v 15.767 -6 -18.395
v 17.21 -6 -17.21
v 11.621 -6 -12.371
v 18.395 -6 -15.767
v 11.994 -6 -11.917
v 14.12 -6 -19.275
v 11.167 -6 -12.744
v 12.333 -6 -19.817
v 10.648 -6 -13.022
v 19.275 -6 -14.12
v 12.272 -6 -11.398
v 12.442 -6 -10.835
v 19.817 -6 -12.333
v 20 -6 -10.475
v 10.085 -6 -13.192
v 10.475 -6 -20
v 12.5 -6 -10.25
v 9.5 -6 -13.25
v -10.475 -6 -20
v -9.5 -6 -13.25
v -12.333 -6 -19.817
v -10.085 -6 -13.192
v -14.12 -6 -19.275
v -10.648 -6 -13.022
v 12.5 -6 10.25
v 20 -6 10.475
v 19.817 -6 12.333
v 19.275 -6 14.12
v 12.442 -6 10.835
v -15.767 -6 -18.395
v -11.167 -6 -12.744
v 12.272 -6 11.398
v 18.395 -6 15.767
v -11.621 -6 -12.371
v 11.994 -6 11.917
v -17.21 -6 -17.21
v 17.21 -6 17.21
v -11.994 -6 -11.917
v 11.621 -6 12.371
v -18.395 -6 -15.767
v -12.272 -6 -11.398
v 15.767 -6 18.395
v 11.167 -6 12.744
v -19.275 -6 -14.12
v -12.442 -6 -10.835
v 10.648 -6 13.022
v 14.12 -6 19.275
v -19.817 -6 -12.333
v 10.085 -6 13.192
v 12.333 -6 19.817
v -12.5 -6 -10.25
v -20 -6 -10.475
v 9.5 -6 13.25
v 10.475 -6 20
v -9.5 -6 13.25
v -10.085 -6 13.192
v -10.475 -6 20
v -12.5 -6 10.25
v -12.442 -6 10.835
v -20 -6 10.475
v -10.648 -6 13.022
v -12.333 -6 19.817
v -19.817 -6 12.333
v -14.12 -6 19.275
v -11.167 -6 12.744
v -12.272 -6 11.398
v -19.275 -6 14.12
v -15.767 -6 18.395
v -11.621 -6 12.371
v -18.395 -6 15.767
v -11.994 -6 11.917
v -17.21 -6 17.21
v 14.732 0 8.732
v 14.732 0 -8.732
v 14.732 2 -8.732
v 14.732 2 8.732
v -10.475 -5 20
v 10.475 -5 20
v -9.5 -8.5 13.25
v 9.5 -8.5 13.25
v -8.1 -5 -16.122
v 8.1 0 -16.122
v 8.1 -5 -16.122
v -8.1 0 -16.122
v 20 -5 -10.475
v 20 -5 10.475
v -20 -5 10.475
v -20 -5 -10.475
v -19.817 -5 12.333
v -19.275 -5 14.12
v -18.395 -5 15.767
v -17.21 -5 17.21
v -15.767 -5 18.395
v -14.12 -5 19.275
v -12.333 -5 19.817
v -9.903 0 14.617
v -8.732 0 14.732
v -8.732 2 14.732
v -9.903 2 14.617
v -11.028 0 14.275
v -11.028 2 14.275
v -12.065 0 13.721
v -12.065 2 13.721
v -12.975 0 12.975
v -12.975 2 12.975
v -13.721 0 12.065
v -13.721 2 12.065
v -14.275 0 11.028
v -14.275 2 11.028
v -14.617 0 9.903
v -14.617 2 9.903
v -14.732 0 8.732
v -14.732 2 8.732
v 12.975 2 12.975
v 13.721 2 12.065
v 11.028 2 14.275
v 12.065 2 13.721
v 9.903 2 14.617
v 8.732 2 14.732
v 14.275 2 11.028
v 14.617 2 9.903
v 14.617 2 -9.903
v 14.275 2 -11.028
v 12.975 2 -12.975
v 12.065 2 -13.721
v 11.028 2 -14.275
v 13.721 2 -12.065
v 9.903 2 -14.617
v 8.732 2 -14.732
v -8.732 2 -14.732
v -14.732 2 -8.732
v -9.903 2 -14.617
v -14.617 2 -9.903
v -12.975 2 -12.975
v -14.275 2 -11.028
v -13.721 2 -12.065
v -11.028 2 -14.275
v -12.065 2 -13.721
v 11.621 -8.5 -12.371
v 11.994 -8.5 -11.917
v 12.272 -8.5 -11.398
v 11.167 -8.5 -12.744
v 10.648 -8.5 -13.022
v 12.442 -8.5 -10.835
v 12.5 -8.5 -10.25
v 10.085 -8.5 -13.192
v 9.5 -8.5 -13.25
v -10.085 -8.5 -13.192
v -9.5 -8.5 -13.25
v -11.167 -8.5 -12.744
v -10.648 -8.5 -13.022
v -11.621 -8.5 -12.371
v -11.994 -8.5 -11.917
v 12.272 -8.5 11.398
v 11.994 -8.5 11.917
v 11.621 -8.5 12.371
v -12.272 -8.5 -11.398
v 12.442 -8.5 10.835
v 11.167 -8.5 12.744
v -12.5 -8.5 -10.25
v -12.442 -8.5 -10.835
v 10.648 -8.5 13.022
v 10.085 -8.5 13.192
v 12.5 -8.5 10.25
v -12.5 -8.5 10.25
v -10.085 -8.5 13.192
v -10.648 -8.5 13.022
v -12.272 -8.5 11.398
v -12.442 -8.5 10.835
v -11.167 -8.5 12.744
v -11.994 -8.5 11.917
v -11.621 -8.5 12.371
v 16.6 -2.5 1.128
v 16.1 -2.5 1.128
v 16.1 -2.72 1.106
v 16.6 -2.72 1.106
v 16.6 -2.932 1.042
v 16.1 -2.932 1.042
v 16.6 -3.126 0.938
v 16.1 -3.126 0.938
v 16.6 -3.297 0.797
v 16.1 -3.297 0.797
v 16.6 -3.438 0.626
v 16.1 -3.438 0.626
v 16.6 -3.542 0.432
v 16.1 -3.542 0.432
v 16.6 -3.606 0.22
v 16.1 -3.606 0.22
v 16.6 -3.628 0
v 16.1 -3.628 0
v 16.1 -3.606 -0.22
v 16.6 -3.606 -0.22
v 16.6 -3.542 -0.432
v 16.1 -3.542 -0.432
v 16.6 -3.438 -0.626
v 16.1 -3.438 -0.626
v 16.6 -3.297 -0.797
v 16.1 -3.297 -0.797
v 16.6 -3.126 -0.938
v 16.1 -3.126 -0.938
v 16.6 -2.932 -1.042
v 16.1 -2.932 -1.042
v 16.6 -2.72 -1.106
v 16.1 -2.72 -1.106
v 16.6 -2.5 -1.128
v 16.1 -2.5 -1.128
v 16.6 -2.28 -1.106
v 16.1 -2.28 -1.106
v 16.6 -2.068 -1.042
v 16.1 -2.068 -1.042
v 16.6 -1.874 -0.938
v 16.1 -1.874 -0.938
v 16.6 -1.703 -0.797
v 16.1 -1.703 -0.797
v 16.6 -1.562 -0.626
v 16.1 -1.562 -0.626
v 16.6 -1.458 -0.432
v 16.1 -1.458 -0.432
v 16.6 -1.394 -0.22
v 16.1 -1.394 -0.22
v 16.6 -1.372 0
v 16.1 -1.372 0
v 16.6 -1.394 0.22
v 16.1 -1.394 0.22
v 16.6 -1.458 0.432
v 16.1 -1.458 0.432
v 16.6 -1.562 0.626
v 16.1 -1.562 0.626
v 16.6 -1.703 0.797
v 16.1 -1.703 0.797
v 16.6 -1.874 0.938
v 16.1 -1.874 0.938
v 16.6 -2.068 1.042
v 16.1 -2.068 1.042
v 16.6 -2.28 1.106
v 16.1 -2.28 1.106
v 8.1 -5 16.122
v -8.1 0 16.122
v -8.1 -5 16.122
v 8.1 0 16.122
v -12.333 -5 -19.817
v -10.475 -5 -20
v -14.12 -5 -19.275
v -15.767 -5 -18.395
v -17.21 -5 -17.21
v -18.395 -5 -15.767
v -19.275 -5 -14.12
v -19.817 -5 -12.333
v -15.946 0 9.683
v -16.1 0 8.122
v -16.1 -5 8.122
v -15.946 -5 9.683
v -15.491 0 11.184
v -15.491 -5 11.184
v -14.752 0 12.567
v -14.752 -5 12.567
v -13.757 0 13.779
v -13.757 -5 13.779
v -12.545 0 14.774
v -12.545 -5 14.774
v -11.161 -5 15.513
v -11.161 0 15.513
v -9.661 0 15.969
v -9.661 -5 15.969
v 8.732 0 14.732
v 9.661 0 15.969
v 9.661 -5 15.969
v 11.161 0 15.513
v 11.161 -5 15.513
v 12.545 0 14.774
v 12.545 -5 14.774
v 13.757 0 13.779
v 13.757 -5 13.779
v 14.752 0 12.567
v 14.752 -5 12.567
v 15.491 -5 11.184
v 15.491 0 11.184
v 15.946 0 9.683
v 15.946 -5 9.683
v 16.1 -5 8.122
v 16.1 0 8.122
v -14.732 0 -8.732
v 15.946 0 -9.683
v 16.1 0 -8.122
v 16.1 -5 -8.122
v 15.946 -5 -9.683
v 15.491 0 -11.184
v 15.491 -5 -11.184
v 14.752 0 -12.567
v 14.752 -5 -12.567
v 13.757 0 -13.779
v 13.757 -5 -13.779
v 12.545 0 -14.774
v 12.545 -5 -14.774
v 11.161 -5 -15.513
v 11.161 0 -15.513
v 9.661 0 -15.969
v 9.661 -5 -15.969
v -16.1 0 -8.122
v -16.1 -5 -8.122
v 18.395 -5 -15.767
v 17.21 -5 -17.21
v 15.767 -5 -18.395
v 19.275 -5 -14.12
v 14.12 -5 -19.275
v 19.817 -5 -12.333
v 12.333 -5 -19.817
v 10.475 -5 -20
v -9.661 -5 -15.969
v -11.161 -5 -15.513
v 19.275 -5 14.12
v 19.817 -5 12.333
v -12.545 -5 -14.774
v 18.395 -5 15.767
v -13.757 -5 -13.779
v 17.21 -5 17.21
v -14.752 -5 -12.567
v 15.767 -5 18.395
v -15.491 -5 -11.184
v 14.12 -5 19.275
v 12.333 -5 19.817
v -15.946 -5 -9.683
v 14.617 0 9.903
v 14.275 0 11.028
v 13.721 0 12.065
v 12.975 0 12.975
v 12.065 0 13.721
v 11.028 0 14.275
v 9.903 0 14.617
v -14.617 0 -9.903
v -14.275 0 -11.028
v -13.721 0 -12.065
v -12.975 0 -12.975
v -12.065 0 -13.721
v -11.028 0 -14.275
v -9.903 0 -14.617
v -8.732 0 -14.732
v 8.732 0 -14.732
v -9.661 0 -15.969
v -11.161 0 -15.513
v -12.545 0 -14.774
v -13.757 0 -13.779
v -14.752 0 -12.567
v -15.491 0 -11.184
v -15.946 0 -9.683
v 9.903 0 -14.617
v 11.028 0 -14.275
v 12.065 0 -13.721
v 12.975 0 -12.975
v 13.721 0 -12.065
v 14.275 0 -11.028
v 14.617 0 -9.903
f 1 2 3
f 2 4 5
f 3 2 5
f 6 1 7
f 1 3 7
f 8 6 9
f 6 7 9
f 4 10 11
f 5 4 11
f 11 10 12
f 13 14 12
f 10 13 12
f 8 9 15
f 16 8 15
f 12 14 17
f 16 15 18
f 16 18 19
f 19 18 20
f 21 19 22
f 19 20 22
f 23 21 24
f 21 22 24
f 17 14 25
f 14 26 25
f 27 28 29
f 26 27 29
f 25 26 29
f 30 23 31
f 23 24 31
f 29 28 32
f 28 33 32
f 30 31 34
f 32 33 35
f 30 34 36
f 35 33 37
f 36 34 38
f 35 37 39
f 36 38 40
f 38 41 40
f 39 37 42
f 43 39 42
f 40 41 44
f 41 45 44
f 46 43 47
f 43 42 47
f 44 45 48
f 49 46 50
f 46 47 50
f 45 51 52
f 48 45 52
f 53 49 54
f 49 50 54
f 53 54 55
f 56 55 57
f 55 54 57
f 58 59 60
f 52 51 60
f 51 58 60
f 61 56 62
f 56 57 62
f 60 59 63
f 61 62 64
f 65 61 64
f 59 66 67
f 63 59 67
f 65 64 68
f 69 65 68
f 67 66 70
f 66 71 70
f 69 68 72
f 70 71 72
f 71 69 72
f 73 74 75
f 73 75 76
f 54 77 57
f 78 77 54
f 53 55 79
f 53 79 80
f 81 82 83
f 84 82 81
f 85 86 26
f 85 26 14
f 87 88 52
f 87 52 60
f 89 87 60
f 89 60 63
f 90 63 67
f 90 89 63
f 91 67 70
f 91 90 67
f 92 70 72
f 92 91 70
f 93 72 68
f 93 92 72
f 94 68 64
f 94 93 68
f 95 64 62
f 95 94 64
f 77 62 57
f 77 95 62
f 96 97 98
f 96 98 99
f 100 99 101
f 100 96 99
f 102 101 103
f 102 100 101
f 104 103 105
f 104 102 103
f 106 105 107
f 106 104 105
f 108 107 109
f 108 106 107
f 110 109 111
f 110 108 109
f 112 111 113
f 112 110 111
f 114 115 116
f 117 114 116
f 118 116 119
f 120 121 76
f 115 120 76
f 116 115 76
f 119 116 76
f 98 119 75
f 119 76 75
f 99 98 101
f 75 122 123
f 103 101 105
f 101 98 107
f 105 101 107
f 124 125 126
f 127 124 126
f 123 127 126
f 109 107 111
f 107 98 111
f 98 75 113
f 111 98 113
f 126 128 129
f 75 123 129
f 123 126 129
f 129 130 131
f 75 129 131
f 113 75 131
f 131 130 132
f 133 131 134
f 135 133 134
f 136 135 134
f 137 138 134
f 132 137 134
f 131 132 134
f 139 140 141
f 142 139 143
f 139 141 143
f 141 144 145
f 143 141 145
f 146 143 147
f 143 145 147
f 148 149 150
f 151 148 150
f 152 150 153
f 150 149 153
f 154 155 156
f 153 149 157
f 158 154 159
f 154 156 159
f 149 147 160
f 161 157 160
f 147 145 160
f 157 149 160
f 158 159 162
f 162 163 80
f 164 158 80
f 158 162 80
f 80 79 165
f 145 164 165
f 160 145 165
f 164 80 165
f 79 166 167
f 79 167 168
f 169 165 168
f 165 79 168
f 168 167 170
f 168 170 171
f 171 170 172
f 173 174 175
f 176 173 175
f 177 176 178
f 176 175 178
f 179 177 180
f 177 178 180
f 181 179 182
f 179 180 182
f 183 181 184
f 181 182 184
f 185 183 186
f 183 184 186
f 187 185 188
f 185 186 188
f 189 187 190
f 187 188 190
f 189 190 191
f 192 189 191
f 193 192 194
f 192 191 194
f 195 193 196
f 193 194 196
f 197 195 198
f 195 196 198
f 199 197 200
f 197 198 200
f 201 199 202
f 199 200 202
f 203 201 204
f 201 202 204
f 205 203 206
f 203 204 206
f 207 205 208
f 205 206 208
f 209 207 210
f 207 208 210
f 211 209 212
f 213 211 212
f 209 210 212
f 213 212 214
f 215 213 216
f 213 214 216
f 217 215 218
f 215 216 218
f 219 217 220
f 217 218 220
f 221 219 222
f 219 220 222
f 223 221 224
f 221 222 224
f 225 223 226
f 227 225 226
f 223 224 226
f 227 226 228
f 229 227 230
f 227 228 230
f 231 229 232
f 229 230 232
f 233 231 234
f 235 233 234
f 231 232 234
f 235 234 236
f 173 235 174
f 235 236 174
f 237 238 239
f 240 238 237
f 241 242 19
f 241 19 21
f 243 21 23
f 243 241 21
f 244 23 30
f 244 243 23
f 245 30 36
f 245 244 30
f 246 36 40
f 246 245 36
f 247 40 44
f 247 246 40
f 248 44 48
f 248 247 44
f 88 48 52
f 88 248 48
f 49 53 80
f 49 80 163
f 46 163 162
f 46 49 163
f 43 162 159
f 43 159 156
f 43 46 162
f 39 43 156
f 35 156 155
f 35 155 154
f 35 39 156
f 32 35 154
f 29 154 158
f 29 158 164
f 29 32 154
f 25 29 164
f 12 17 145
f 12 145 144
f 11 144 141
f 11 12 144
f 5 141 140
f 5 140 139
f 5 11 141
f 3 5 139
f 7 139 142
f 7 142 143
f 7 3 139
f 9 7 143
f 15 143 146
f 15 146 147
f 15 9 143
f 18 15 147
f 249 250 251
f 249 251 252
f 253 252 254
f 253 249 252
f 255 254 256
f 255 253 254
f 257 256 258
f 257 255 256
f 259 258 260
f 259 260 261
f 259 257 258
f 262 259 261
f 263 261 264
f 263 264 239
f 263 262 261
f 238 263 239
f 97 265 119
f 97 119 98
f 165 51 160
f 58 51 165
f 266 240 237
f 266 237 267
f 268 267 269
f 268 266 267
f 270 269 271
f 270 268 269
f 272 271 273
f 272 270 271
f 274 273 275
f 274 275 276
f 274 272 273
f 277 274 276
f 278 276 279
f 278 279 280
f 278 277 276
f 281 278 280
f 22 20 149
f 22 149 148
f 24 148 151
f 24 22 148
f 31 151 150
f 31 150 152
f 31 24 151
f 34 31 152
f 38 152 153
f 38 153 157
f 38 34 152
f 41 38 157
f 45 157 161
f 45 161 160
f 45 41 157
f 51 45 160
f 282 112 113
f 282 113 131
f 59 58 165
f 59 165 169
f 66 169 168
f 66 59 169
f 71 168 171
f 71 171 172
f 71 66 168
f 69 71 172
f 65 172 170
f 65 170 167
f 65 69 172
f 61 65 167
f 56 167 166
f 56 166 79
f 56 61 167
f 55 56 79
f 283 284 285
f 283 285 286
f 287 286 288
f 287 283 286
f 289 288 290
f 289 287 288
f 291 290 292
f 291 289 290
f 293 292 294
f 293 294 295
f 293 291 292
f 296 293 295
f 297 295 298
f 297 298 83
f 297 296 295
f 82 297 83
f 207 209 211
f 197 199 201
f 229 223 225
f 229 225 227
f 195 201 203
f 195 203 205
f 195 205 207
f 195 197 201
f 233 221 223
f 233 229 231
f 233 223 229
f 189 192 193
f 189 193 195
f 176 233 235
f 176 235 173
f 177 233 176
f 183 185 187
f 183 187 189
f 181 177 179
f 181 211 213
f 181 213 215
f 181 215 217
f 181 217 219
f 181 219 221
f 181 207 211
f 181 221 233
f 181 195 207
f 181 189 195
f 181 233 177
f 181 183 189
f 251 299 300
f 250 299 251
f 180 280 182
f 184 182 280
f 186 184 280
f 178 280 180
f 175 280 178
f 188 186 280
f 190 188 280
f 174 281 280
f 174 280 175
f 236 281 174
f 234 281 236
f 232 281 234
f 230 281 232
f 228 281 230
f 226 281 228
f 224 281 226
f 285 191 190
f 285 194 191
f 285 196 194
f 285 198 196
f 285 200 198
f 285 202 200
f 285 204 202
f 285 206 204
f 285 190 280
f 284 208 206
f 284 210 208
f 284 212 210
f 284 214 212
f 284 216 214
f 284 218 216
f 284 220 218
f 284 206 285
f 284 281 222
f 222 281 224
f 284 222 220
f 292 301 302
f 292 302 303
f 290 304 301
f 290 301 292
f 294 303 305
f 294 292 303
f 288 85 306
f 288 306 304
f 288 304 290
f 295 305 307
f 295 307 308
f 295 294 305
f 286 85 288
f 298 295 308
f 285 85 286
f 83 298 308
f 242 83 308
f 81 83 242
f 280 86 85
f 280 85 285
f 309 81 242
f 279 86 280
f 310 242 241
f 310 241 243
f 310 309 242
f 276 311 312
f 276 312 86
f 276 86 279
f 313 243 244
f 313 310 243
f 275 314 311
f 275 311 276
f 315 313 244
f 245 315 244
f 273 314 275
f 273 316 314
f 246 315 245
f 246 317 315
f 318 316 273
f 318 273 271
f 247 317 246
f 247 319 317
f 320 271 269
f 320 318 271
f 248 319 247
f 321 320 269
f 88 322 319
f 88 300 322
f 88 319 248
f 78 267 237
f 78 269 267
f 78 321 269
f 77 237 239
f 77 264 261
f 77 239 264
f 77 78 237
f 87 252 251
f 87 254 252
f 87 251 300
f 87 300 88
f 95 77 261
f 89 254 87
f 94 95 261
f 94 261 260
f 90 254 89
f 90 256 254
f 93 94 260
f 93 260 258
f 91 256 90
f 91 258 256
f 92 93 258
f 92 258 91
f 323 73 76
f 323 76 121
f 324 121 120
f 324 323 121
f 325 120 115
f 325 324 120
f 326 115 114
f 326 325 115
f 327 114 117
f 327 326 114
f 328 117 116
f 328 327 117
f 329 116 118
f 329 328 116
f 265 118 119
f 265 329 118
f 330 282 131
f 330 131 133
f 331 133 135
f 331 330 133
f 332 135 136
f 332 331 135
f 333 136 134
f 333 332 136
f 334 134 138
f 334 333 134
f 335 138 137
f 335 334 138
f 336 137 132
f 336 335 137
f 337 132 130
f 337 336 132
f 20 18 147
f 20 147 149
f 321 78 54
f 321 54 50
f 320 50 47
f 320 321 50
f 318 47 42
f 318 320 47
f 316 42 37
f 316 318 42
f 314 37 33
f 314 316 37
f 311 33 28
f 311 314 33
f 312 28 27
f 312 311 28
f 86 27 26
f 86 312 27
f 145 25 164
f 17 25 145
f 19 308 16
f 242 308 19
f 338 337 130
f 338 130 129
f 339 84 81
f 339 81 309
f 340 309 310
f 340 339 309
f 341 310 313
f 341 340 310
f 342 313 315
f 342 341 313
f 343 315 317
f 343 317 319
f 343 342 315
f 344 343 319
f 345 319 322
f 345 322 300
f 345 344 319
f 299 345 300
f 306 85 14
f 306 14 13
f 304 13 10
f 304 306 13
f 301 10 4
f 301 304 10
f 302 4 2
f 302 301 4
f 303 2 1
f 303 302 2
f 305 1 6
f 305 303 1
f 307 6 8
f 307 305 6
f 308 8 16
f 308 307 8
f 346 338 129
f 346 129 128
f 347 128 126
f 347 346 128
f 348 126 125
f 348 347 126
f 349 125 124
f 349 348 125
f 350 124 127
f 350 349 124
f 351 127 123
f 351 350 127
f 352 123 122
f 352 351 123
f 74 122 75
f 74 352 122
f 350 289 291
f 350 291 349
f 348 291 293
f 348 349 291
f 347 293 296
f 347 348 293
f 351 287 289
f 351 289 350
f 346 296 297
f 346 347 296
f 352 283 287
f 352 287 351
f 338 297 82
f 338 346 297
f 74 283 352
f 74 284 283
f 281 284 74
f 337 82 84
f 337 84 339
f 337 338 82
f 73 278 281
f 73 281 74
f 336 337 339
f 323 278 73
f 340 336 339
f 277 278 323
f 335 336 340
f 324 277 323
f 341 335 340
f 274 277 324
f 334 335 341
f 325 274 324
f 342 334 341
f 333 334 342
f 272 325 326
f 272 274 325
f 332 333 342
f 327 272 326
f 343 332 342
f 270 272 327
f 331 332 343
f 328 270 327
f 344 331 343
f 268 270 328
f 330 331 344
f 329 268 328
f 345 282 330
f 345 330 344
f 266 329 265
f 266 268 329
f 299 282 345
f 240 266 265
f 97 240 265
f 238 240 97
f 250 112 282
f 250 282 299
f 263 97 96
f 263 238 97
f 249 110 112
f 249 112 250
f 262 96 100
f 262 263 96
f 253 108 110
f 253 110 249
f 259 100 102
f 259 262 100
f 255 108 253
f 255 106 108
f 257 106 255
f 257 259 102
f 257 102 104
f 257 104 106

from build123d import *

# Parameters (mm, degrees)
BOSS_EXTRUDE1_DEPTH = 2
BOSS_EXTRUDE2_DEPTH = 5
BOSS_EXTRUDE3_DEPTH = 1
BOSS_EXTRUDE4_DEPTH = 2.5
SKETCH5_R           = 1.127617125
BOSS_EXTRUDE5_DEPTH = 0.5


with BuildPart() as part:
    # Sketch1 → Boss-Extrude1 (new body)
    with BuildSketch(Plane(origin=(0, 0, 0), x_dir=(1, 0, 0), z_dir=(0, 1, 0))):
        with BuildLine():
            Line((8.732, -14.732), (-8.732, -14.732))
            ThreePointArc((-8.732, -14.732), (-12.974640687, -12.974640687), (-14.732, -8.732))
            Line((-14.732, -8.732), (-14.732, 8.732))
            ThreePointArc((-14.732, 8.732), (-12.974640687, 12.974640687), (-8.732, 14.732))
            Line((-8.732, 14.732), (8.732, 14.732))
            ThreePointArc((8.732, 14.732), (12.974640687, 12.974640687), (14.732, 8.732))
            Line((14.732, 8.732), (14.732, -8.732))
            ThreePointArc((14.732, -8.732), (12.974640687, -12.974640687), (8.732, -14.732))
        make_face()
    extrude(amount=BOSS_EXTRUDE1_DEPTH)

    # Sketch2 → Boss-Extrude2 (add)
    with BuildSketch(Plane.XZ):
        with BuildLine():
            Line((8.1, -16.122288114), (-8.1, -16.122288114))
            ThreePointArc((-8.1, -16.122288114), (-13.756854249, -13.779142364), (-16.1, -8.122288114))
            Line((-16.1, -8.122288114), (-16.1, 8.122288114))
            ThreePointArc((-16.1, 8.122288114), (-13.756854249, 13.779142364), (-8.1, 16.122288114))
            Line((-8.1, 16.122288114), (8.1, 16.122288114))
            ThreePointArc((8.1, 16.122288114), (13.756854249, 13.779142364), (16.1, 8.122288114))
            Line((16.1, 8.122288114), (16.1, -8.122288114))
            ThreePointArc((16.1, -8.122288114), (13.756854249, -13.779142364), (8.1, -16.122288114))
        make_face()
    extrude(amount=BOSS_EXTRUDE2_DEPTH)

    # Sketch3 → Boss-Extrude3 (add)
    with BuildSketch(Plane.XZ.offset(5)):
        with BuildLine():
            Line((10.47496, -20), (-10.47496, -20))
            ThreePointArc((-10.47496, -20), (-17.210152091, -17.210192091), (-19.99996, -10.475))
            Line((-19.99996, -10.475), (-19.99996, 10.475))
            ThreePointArc((-19.99996, 10.475), (-17.210152091, 17.210192091), (-10.47496, 20))
            Line((-10.47496, 20), (10.47496, 20))
            ThreePointArc((10.47496, 20), (17.210152091, 17.210192091), (19.99996, 10.475))
            Line((19.99996, 10.475), (19.99996, -10.475))
            ThreePointArc((19.99996, -10.475), (17.210152091, -17.210192091), (10.47496, -20))
        make_face()
    extrude(amount=BOSS_EXTRUDE3_DEPTH)

    # Sketch4 → Boss-Extrude4 (add)
    with BuildSketch(Plane.XZ.offset(6)):
        with BuildLine():
            Line((9.5, -13.25), (-9.5, -13.25))
            ThreePointArc((-9.5, -13.25), (-11.621320344, -12.371320344), (-12.5, -10.25))
            Line((-12.5, -10.25), (-12.5, 10.25))
            ThreePointArc((-12.5, 10.25), (-11.621320344, 12.371320344), (-9.5, 13.25))
            Line((-9.5, 13.25), (9.5, 13.25))
            ThreePointArc((9.5, 13.25), (11.621320344, 12.371320344), (12.5, 10.25))
            Line((12.5, 10.25), (12.5, -10.25))
            ThreePointArc((12.5, -10.25), (11.621320344, -12.371320344), (9.5, -13.25))
        make_face()
    extrude(amount=BOSS_EXTRUDE4_DEPTH)

    # Sketch5 → Boss-Extrude5 (add)
    with BuildSketch(Plane(origin=(16.1, 0, 0), x_dir=(0, 0, -1), z_dir=(1, 0, 0))):
        with Locations(Location((0, -2.5, 0), (0, 0, 180))):
            Circle(SKETCH5_R)
    extrude(amount=BOSS_EXTRUDE5_DEPTH)


solid = part.part
